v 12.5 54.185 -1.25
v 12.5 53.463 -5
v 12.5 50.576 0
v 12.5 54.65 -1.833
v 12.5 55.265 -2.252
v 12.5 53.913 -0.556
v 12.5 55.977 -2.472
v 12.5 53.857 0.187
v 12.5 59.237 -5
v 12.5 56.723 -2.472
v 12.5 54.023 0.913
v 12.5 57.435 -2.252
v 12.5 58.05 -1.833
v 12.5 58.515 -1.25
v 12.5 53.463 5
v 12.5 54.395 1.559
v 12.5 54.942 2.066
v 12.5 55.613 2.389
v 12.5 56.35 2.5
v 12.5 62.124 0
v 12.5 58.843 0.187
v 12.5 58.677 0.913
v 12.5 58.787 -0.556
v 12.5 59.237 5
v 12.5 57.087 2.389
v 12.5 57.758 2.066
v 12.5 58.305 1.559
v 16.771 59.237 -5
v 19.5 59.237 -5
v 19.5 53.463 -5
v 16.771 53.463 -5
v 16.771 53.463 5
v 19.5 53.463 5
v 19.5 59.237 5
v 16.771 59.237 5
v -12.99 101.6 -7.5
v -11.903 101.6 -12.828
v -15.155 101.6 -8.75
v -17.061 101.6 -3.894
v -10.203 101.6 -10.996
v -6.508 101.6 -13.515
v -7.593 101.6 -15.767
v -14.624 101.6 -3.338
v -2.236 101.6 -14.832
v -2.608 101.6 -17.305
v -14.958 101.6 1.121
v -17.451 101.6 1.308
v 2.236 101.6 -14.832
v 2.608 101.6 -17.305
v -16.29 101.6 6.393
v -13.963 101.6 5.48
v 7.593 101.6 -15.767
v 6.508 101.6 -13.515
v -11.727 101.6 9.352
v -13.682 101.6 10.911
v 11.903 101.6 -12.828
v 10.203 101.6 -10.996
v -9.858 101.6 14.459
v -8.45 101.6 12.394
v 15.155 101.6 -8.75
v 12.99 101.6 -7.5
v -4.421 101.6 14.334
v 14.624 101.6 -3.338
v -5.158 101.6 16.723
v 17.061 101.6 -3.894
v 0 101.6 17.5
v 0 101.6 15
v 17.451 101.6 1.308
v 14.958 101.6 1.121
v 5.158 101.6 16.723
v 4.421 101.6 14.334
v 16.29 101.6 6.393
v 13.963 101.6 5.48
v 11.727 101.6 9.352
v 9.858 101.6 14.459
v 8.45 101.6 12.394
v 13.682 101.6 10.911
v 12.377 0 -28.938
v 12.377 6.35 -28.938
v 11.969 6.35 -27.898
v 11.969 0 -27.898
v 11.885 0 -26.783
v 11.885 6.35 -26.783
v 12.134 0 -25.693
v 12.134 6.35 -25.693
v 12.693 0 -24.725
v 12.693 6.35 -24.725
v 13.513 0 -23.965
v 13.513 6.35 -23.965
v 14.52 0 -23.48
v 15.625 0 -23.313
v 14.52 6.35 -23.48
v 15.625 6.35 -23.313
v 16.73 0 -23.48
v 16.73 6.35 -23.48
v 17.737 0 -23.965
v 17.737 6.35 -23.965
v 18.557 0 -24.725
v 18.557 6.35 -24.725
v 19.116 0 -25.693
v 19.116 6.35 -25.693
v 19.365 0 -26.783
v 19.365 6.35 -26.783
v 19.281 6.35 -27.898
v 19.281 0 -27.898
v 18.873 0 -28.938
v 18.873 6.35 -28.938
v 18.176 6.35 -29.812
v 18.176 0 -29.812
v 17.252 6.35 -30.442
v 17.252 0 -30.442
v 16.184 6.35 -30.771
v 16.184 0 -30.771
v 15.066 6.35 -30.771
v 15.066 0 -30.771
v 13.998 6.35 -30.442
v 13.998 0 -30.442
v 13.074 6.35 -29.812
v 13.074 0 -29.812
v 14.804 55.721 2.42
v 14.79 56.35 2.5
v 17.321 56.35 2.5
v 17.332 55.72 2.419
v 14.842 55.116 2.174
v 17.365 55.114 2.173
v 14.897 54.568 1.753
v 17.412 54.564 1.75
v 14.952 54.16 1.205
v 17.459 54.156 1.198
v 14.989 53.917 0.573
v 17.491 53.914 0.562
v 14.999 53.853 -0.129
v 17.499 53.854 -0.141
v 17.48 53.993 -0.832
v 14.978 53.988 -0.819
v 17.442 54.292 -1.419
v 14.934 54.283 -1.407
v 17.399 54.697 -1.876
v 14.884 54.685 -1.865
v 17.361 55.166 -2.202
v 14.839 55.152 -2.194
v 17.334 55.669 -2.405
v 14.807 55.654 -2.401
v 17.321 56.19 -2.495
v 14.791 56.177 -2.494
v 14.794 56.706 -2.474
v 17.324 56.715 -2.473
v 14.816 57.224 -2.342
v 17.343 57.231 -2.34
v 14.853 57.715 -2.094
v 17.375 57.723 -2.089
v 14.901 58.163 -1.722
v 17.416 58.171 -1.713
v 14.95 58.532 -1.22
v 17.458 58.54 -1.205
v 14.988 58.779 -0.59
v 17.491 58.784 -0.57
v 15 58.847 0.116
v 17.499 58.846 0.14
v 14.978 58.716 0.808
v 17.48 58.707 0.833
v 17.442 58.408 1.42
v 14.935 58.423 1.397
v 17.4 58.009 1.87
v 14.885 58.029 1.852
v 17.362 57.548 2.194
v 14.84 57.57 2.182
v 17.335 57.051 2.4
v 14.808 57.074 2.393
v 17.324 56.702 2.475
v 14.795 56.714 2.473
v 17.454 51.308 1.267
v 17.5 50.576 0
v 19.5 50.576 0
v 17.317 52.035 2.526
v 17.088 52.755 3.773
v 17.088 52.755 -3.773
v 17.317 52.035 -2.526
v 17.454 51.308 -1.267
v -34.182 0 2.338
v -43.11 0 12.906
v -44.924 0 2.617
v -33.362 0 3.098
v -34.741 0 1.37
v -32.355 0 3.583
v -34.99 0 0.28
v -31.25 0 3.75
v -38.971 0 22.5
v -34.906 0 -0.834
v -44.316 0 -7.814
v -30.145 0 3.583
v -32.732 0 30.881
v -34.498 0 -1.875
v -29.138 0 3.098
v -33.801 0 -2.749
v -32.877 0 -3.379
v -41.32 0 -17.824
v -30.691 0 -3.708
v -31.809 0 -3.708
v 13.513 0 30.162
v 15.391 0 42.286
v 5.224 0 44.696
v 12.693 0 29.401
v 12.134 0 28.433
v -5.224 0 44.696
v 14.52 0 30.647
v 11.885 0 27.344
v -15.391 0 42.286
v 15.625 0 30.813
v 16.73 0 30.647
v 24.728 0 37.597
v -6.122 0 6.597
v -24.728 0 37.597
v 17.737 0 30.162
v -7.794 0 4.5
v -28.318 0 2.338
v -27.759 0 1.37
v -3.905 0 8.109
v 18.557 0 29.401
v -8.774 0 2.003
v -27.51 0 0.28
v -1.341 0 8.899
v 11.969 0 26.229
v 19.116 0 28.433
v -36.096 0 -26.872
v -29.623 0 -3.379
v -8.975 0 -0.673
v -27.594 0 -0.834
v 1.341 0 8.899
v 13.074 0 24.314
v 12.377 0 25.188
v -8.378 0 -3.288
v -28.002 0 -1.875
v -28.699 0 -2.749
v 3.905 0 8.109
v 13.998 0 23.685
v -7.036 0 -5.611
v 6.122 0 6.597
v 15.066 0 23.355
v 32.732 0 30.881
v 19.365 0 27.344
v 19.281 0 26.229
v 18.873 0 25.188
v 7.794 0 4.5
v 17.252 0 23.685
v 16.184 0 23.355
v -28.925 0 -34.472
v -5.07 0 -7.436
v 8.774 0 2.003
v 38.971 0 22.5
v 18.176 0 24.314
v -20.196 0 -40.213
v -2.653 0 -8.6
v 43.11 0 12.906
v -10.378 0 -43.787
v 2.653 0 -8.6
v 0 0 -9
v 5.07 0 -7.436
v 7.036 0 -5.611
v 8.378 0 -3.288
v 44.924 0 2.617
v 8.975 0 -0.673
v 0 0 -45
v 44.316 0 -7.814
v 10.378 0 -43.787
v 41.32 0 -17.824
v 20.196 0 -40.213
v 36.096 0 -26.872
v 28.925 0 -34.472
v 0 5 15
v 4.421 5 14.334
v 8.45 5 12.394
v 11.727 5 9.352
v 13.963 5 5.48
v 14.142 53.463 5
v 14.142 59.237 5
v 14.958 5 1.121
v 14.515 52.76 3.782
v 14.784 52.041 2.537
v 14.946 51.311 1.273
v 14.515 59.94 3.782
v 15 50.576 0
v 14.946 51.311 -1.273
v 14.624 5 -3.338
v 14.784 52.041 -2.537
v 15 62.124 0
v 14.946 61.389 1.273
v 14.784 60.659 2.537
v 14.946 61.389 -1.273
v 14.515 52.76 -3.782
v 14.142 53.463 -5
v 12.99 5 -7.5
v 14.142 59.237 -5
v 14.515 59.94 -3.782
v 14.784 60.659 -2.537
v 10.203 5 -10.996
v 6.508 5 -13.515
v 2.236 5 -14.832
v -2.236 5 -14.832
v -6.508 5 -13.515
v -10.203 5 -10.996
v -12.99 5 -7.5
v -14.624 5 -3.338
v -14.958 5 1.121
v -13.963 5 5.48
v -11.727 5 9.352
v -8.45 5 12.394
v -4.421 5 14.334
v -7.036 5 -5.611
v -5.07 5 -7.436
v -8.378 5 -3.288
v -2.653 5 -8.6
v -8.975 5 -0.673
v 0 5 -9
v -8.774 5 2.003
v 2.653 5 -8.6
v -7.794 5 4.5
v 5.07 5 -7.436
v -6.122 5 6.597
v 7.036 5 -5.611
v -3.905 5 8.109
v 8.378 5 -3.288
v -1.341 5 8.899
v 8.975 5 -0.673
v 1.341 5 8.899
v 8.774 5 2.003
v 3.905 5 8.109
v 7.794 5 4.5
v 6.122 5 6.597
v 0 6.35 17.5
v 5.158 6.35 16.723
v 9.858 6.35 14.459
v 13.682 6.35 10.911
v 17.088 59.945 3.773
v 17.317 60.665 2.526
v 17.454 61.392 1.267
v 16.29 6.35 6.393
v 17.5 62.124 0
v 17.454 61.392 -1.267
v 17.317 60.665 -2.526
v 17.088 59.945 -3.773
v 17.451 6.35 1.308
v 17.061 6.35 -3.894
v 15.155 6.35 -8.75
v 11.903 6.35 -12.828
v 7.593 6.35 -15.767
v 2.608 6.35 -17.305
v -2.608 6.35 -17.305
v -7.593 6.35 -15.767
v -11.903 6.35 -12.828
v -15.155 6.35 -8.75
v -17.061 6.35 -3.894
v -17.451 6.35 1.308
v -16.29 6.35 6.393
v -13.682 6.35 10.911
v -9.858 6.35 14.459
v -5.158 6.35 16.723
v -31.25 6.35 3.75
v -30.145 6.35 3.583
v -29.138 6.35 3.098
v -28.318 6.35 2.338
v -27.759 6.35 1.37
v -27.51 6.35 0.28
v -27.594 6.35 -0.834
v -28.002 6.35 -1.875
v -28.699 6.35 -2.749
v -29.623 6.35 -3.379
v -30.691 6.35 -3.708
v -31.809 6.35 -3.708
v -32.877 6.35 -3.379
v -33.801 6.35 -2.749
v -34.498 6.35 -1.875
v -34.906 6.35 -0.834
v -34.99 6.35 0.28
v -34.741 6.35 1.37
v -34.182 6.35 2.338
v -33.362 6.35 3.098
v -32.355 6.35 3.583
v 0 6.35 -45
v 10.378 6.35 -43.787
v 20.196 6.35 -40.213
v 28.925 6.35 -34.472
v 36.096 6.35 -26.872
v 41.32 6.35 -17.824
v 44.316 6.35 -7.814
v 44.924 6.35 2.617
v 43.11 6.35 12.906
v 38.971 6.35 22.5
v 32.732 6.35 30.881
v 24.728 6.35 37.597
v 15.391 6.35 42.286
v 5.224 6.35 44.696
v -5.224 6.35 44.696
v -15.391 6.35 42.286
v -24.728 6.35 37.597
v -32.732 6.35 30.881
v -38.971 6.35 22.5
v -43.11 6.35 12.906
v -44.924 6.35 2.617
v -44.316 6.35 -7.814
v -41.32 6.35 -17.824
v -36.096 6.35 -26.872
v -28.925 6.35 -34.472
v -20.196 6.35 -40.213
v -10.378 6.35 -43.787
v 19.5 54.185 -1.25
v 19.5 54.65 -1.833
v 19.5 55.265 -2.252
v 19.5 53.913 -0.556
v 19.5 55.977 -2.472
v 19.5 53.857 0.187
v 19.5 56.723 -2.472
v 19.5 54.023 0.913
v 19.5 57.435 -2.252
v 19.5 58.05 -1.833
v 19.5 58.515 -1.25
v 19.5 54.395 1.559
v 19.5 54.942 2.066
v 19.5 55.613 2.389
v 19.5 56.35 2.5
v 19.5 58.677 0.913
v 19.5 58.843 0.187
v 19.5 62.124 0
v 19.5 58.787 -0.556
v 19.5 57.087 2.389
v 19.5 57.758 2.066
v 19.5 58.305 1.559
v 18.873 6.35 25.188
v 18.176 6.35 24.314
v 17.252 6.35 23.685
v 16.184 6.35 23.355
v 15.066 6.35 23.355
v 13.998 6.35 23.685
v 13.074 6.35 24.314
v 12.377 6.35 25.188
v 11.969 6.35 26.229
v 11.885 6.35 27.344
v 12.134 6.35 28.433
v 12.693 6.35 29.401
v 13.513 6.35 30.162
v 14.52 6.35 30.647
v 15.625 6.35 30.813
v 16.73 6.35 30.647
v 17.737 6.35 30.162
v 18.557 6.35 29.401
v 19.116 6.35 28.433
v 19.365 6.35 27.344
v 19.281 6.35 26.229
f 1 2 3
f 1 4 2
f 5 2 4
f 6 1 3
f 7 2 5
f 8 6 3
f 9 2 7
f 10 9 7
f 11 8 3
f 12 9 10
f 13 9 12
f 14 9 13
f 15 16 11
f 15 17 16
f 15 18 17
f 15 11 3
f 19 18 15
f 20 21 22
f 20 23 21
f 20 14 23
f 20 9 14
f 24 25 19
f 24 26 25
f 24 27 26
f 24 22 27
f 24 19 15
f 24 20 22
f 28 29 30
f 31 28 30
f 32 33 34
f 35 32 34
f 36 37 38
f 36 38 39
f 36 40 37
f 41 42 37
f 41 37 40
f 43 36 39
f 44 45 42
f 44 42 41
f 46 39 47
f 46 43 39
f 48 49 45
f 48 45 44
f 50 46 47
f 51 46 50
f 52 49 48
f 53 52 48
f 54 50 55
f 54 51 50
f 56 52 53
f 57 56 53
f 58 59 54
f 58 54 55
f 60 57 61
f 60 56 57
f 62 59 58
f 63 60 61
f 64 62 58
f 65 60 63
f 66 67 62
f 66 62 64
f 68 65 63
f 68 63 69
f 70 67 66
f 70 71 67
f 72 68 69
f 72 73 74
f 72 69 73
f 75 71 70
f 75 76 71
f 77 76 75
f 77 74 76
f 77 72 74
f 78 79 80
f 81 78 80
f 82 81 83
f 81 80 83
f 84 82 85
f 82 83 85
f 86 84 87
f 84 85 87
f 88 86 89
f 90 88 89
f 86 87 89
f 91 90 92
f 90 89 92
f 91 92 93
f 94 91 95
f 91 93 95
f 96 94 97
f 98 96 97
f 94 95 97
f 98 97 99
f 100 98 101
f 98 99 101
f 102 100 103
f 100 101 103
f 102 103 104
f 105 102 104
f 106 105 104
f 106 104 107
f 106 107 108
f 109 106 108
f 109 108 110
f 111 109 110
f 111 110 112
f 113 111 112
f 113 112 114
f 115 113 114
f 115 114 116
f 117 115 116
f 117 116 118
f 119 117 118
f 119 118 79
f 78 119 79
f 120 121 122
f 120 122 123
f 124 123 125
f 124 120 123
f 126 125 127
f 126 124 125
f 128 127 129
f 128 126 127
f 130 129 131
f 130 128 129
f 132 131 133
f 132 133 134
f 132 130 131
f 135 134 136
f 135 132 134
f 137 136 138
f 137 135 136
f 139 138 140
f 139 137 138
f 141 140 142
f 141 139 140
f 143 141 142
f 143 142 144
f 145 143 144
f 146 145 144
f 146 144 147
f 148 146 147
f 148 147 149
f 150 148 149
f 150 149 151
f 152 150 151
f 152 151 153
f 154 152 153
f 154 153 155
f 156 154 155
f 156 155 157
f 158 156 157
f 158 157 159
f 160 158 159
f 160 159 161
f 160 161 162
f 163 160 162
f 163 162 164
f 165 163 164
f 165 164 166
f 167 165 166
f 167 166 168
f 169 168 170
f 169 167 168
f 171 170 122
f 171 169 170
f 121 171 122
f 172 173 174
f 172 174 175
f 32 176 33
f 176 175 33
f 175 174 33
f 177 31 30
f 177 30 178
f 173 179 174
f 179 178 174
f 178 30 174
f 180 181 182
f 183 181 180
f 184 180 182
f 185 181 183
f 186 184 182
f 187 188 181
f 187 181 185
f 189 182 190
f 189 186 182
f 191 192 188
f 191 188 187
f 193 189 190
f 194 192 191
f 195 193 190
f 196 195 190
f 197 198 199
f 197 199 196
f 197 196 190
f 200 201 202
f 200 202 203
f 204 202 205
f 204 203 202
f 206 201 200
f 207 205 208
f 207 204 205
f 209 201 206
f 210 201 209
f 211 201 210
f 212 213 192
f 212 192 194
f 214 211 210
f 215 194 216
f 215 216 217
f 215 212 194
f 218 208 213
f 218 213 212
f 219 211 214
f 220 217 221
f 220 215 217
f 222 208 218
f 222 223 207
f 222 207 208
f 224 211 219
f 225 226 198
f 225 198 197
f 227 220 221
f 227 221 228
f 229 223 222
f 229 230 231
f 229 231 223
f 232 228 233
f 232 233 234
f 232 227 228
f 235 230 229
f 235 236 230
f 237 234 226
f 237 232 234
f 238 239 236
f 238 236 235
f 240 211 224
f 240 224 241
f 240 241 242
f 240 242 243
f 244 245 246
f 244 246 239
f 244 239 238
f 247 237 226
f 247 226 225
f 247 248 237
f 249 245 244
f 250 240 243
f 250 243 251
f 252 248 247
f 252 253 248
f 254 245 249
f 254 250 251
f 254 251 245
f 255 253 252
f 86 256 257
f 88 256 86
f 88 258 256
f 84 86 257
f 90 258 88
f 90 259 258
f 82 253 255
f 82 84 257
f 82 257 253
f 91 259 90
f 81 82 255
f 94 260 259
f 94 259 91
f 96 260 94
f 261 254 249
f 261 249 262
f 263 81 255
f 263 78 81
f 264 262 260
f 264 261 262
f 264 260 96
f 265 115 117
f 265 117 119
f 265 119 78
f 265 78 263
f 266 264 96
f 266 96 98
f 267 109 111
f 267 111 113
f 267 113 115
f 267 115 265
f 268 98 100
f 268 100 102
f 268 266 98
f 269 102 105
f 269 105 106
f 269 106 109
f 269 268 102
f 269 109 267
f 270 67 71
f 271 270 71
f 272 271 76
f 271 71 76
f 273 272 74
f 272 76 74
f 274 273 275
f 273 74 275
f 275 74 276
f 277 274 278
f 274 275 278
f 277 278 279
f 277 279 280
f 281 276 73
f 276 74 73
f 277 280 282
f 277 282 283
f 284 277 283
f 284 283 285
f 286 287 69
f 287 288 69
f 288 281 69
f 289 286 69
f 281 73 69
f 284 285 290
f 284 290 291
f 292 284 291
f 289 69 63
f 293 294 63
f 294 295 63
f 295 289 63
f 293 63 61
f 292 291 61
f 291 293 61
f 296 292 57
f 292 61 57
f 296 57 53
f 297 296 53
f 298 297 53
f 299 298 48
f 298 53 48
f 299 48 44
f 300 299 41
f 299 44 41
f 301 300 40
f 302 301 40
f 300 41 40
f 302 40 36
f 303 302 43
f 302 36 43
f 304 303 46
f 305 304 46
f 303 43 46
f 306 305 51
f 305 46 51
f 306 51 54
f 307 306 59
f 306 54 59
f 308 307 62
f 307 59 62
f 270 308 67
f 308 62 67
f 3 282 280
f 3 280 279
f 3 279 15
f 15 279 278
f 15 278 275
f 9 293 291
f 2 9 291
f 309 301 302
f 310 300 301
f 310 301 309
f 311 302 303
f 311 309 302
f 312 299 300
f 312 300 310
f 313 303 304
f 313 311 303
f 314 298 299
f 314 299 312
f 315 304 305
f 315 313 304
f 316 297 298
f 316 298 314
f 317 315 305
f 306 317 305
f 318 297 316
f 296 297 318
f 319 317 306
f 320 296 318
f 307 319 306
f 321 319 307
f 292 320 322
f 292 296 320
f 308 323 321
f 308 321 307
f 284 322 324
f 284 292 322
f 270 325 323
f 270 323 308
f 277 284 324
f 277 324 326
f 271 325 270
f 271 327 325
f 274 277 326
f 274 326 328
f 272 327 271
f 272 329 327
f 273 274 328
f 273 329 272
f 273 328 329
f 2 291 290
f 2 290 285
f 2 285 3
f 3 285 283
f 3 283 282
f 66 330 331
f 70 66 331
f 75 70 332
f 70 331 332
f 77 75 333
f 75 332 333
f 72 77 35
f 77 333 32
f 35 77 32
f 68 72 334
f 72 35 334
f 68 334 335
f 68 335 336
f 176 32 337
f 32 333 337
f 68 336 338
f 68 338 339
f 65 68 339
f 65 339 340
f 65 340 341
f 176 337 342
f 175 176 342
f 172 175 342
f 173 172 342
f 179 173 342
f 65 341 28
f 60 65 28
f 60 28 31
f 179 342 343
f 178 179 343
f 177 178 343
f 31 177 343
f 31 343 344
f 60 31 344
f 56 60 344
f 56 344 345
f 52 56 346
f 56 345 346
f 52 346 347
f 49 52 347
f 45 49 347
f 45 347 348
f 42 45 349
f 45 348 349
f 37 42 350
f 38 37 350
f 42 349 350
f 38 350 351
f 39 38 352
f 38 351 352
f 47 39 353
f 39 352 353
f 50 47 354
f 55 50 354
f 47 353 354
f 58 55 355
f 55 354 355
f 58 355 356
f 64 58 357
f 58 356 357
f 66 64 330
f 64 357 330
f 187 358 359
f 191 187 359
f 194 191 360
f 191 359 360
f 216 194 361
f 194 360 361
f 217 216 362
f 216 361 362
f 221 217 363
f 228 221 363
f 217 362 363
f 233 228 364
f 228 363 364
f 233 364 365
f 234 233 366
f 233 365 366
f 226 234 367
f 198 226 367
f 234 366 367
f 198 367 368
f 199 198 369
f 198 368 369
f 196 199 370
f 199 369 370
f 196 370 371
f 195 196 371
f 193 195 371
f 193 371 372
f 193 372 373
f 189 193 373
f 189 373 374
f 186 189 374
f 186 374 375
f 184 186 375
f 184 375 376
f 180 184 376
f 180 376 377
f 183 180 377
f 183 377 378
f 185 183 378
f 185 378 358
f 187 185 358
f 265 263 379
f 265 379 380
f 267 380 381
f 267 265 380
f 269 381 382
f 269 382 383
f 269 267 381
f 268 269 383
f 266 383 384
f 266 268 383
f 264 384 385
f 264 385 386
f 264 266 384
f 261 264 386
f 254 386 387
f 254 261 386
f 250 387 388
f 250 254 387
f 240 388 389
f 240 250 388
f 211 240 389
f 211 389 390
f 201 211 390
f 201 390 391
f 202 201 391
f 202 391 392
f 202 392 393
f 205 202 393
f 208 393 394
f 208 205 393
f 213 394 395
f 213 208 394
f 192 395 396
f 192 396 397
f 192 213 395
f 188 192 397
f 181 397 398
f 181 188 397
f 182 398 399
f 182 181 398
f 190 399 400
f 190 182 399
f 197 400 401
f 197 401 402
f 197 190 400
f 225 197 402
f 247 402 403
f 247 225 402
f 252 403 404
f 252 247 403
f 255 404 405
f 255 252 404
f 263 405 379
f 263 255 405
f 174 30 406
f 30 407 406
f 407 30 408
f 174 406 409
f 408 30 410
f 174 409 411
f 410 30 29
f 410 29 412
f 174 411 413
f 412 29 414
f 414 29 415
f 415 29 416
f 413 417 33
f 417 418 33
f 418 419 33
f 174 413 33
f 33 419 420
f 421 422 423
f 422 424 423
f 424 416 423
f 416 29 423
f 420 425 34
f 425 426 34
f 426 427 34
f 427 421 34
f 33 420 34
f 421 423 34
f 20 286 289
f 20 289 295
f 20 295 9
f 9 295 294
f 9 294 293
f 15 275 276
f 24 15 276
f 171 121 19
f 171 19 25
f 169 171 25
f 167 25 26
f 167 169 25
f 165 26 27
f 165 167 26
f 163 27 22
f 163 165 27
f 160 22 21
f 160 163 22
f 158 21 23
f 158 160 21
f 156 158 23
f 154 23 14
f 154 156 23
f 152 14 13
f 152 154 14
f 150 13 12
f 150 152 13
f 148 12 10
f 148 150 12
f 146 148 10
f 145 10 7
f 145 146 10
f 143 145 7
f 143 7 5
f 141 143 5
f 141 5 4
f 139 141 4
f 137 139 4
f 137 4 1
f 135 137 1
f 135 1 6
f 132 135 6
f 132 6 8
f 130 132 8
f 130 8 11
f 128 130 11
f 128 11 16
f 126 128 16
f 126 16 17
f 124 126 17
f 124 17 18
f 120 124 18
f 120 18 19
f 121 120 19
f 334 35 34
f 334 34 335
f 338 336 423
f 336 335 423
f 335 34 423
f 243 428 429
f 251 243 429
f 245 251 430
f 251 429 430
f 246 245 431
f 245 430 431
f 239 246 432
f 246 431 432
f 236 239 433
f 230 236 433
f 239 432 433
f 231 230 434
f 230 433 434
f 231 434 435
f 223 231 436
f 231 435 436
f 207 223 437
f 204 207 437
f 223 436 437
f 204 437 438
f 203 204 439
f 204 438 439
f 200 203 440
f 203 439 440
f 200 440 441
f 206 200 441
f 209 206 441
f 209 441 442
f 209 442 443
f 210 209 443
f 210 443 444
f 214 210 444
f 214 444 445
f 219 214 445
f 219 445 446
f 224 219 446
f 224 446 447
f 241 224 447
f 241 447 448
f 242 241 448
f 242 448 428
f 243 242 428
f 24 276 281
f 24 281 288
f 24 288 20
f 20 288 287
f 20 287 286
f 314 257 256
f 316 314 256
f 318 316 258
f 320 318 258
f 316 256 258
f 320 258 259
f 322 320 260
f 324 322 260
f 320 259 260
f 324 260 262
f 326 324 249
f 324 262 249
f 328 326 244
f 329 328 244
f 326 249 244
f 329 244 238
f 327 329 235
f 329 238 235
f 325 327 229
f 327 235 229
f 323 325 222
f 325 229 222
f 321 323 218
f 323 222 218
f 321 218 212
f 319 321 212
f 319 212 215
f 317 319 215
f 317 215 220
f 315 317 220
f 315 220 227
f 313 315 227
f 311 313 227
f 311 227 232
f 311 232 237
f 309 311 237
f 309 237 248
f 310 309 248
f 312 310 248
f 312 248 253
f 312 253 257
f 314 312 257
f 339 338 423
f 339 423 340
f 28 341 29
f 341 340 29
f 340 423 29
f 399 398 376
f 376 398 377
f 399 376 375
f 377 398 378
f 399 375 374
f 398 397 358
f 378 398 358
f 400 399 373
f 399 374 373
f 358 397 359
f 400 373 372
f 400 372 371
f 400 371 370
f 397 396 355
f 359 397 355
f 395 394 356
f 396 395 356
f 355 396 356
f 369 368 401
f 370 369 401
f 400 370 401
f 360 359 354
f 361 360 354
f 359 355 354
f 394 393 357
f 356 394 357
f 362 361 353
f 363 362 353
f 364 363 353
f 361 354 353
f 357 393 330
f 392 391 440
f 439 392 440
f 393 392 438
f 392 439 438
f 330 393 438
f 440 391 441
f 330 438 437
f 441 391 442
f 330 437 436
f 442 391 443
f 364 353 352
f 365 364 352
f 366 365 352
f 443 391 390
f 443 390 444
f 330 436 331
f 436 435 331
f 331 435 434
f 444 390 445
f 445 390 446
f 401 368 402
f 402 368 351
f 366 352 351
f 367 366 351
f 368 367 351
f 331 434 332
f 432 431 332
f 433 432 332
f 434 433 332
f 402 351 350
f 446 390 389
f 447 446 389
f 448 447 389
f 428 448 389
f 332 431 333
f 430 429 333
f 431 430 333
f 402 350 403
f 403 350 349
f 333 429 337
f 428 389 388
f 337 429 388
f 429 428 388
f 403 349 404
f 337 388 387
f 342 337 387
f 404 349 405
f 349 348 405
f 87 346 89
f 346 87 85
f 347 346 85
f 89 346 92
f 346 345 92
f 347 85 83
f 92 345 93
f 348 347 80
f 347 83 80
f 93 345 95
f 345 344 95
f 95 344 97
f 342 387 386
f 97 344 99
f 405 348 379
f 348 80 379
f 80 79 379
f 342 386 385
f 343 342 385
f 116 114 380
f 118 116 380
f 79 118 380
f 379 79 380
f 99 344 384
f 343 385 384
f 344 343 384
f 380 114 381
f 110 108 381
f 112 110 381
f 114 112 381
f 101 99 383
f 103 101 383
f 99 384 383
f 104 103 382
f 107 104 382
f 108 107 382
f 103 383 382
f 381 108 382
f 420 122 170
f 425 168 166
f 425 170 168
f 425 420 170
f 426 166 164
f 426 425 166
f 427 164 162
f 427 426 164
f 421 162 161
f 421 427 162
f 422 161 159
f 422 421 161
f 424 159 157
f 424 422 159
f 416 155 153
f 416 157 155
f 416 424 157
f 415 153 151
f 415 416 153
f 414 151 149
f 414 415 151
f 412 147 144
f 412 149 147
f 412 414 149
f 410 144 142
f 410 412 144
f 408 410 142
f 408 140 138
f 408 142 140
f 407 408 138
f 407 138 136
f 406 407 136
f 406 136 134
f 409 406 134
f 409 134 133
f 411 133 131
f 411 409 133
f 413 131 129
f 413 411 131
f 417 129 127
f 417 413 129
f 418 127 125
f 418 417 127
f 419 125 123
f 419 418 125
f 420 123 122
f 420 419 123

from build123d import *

# Parameters (mm, degrees)
SKETCH2_R                = 17.5
BOSS_EXTRUDE2_DEPTH      = 101.6
SKETCH3_R                = 45
BOSS_EXTRUDE3_DEPTH      = 6.35
SKETCH4_R                = 9
CUT_EXTRUDE1_DEPTH       = 95.25
SKETCH5_R                = 14.999999972
CUT_EXTRUDE2_DEPTH       = 96.6
SKETCH6_R                = 2.5
CUT_EXTRUDE3_DEPTH       = 120.885612148
BOSS_EXTRUDE4_DEPTH      = 5
BOSS_EXTRUDE4_DEPTH_BACK = 2
SKETCH8_R                = 2.5
SKETCH9_R                = 3.75
CUT_EXTRUDE4_DEPTH       = 115.553753758
CIRPATTERN1_COUNT        = 3


with BuildPart() as part:
    # Sketch2 → Boss-Extrude2 (new body)
    with BuildSketch(Plane(origin=(0, 0, 0), x_dir=(1, 0, 0), z_dir=(0, 1, 0))):
        with Locations(Location((0, 0, 0), (0, 0, 270))):
            Circle(SKETCH2_R)
    extrude(amount=BOSS_EXTRUDE2_DEPTH)

    # Sketch3 → Boss-Extrude3 (add)
    with BuildSketch(Plane(origin=(0, 0, 0), x_dir=(-1, 0, 0), z_dir=(0, -1, 0))):
        with Locations(Location((0, 0, 0), (0, 0, 90))):
            Circle(SKETCH3_R)
    extrude(amount=-BOSS_EXTRUDE3_DEPTH)

    # Sketch4 → Cut-Extrude1 (cut)
    with BuildSketch(Plane(origin=(0, 0, 0), x_dir=(-1, 0, 0), z_dir=(0, -1, 0))):
        with Locations(Location((0, 0, 0), (0, 0, 90))):
            Circle(SKETCH4_R)
    extrude(amount=-CUT_EXTRUDE1_DEPTH, mode=Mode.SUBTRACT)

    # Sketch5 → Cut-Extrude2 (cut)
    with BuildSketch(Plane(origin=(0, 101.6, 0), x_dir=(1, 0, 0), z_dir=(0, 1, 0))):
        with Locations(Location((0, 0, 0), (0, 0, 270))):
            Circle(SKETCH5_R)
    extrude(amount=-CUT_EXTRUDE2_DEPTH, mode=Mode.SUBTRACT)

    # Sketch6 → Cut-Extrude3 (cut, through all)
    with BuildSketch(Plane(origin=(0, 0, 0), x_dir=(0, 0, -1), z_dir=(1, 0, 0))):
        with Locations(Location((0, 56.35, 0), (0, 0, 180))):
            Circle(SKETCH6_R)
    extrude(amount=CUT_EXTRUDE3_DEPTH, mode=Mode.SUBTRACT)

    # Sketch8 → Boss-Extrude4 (add, two sides: drawn at the far end of the back side and taken through both)
    with BuildSketch(Plane.ZY.offset(-17.5).offset(-BOSS_EXTRUDE4_DEPTH_BACK)):
        Polygon((-5, 53.463248654), (0, 50.576497308), (5, 53.463248654), (5, 59.236751346), (0, 62.123502692), (-5, 59.236751346), align=None)
        with Locations((0, 56.35)):
            Circle(SKETCH8_R, mode=Mode.SUBTRACT)
    extrude(amount=BOSS_EXTRUDE4_DEPTH + BOSS_EXTRUDE4_DEPTH_BACK)

    # Sketch9 → Cut-Extrude4 (cut, through all)
    with BuildSketch(Plane(origin=(0, 6.35, 0), x_dir=(1, 0, 0), z_dir=(0, 1, 0))):
        with Locations(Location((-31.25, 0, 0), (0, 0, 270))):
            Circle(SKETCH9_R)
    cut_extrude4 = extrude(amount=-CUT_EXTRUDE4_DEPTH, mode=Mode.SUBTRACT)

    # CirPattern1: Cut-Extrude4 ×3 about axis
    cirpattern1_axis = Axis((0, 0, 0), (0, 1, 0))
    for i in range(1, CIRPATTERN1_COUNT):
        add(cut_extrude4.rotate(cirpattern1_axis, i * 360 / CIRPATTERN1_COUNT), mode=Mode.SUBTRACT)


solid = part.part
